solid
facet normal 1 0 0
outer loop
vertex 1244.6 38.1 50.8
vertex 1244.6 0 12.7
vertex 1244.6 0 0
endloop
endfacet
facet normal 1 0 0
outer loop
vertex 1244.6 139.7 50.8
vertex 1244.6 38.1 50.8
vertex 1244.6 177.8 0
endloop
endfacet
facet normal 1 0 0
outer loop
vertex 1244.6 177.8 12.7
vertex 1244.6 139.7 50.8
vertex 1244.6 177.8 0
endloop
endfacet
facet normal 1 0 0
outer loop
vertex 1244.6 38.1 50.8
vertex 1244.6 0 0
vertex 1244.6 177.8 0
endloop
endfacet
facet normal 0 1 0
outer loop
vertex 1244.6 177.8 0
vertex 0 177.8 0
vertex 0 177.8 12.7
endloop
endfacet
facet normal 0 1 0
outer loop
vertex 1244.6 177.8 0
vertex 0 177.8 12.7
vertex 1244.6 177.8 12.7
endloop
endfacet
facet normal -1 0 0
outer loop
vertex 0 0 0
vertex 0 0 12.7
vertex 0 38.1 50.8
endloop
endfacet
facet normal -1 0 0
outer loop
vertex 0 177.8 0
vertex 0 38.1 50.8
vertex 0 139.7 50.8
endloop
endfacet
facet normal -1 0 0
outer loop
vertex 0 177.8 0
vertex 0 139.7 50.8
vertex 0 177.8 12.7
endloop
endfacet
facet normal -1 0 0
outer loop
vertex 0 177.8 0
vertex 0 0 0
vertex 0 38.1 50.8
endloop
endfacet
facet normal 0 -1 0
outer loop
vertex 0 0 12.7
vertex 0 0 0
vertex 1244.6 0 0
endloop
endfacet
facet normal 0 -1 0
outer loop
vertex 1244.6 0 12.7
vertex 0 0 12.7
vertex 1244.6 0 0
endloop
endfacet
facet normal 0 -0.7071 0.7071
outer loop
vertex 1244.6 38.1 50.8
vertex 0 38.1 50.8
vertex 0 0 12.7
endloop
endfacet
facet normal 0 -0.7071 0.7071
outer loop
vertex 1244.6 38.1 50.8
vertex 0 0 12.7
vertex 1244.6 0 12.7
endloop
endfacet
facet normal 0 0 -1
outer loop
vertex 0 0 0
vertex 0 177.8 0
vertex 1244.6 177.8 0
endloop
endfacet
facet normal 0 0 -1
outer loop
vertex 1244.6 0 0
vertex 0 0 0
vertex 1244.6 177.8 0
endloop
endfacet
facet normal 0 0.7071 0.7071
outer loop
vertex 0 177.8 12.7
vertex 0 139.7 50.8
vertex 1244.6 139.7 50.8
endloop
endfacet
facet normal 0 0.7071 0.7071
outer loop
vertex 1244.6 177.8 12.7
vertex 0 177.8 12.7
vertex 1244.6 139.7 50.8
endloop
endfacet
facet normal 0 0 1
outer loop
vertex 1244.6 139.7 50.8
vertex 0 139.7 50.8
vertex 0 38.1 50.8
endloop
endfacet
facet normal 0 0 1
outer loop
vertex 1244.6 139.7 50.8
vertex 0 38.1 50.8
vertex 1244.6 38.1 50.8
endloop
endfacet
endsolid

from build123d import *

# Parameters (mm, degrees)
F0_W     = 1244.6
F0_H     = 177.8
F1_DEPTH = 50.8
F2_SIZE2 = 38.1
F2_SIZE  = 38.1


with BuildPart() as f1:
    # F0 (on Top) → F1 (new body)
    with BuildSketch(Plane.XY):
        with Locations((622.3, 88.9)):
            Rectangle(F0_W, F0_H)
    extrude(amount=F1_DEPTH)

    # F2
    f2_edges = [f1.edges().sort_by_distance(p)[0] for p in [
        (622.3, 0, 50.8),
        (622.3, 177.8, 50.8),
    ]]
    chamfer(f2_edges, length=F2_SIZE, length2=F2_SIZE2)


solid = f1.part
